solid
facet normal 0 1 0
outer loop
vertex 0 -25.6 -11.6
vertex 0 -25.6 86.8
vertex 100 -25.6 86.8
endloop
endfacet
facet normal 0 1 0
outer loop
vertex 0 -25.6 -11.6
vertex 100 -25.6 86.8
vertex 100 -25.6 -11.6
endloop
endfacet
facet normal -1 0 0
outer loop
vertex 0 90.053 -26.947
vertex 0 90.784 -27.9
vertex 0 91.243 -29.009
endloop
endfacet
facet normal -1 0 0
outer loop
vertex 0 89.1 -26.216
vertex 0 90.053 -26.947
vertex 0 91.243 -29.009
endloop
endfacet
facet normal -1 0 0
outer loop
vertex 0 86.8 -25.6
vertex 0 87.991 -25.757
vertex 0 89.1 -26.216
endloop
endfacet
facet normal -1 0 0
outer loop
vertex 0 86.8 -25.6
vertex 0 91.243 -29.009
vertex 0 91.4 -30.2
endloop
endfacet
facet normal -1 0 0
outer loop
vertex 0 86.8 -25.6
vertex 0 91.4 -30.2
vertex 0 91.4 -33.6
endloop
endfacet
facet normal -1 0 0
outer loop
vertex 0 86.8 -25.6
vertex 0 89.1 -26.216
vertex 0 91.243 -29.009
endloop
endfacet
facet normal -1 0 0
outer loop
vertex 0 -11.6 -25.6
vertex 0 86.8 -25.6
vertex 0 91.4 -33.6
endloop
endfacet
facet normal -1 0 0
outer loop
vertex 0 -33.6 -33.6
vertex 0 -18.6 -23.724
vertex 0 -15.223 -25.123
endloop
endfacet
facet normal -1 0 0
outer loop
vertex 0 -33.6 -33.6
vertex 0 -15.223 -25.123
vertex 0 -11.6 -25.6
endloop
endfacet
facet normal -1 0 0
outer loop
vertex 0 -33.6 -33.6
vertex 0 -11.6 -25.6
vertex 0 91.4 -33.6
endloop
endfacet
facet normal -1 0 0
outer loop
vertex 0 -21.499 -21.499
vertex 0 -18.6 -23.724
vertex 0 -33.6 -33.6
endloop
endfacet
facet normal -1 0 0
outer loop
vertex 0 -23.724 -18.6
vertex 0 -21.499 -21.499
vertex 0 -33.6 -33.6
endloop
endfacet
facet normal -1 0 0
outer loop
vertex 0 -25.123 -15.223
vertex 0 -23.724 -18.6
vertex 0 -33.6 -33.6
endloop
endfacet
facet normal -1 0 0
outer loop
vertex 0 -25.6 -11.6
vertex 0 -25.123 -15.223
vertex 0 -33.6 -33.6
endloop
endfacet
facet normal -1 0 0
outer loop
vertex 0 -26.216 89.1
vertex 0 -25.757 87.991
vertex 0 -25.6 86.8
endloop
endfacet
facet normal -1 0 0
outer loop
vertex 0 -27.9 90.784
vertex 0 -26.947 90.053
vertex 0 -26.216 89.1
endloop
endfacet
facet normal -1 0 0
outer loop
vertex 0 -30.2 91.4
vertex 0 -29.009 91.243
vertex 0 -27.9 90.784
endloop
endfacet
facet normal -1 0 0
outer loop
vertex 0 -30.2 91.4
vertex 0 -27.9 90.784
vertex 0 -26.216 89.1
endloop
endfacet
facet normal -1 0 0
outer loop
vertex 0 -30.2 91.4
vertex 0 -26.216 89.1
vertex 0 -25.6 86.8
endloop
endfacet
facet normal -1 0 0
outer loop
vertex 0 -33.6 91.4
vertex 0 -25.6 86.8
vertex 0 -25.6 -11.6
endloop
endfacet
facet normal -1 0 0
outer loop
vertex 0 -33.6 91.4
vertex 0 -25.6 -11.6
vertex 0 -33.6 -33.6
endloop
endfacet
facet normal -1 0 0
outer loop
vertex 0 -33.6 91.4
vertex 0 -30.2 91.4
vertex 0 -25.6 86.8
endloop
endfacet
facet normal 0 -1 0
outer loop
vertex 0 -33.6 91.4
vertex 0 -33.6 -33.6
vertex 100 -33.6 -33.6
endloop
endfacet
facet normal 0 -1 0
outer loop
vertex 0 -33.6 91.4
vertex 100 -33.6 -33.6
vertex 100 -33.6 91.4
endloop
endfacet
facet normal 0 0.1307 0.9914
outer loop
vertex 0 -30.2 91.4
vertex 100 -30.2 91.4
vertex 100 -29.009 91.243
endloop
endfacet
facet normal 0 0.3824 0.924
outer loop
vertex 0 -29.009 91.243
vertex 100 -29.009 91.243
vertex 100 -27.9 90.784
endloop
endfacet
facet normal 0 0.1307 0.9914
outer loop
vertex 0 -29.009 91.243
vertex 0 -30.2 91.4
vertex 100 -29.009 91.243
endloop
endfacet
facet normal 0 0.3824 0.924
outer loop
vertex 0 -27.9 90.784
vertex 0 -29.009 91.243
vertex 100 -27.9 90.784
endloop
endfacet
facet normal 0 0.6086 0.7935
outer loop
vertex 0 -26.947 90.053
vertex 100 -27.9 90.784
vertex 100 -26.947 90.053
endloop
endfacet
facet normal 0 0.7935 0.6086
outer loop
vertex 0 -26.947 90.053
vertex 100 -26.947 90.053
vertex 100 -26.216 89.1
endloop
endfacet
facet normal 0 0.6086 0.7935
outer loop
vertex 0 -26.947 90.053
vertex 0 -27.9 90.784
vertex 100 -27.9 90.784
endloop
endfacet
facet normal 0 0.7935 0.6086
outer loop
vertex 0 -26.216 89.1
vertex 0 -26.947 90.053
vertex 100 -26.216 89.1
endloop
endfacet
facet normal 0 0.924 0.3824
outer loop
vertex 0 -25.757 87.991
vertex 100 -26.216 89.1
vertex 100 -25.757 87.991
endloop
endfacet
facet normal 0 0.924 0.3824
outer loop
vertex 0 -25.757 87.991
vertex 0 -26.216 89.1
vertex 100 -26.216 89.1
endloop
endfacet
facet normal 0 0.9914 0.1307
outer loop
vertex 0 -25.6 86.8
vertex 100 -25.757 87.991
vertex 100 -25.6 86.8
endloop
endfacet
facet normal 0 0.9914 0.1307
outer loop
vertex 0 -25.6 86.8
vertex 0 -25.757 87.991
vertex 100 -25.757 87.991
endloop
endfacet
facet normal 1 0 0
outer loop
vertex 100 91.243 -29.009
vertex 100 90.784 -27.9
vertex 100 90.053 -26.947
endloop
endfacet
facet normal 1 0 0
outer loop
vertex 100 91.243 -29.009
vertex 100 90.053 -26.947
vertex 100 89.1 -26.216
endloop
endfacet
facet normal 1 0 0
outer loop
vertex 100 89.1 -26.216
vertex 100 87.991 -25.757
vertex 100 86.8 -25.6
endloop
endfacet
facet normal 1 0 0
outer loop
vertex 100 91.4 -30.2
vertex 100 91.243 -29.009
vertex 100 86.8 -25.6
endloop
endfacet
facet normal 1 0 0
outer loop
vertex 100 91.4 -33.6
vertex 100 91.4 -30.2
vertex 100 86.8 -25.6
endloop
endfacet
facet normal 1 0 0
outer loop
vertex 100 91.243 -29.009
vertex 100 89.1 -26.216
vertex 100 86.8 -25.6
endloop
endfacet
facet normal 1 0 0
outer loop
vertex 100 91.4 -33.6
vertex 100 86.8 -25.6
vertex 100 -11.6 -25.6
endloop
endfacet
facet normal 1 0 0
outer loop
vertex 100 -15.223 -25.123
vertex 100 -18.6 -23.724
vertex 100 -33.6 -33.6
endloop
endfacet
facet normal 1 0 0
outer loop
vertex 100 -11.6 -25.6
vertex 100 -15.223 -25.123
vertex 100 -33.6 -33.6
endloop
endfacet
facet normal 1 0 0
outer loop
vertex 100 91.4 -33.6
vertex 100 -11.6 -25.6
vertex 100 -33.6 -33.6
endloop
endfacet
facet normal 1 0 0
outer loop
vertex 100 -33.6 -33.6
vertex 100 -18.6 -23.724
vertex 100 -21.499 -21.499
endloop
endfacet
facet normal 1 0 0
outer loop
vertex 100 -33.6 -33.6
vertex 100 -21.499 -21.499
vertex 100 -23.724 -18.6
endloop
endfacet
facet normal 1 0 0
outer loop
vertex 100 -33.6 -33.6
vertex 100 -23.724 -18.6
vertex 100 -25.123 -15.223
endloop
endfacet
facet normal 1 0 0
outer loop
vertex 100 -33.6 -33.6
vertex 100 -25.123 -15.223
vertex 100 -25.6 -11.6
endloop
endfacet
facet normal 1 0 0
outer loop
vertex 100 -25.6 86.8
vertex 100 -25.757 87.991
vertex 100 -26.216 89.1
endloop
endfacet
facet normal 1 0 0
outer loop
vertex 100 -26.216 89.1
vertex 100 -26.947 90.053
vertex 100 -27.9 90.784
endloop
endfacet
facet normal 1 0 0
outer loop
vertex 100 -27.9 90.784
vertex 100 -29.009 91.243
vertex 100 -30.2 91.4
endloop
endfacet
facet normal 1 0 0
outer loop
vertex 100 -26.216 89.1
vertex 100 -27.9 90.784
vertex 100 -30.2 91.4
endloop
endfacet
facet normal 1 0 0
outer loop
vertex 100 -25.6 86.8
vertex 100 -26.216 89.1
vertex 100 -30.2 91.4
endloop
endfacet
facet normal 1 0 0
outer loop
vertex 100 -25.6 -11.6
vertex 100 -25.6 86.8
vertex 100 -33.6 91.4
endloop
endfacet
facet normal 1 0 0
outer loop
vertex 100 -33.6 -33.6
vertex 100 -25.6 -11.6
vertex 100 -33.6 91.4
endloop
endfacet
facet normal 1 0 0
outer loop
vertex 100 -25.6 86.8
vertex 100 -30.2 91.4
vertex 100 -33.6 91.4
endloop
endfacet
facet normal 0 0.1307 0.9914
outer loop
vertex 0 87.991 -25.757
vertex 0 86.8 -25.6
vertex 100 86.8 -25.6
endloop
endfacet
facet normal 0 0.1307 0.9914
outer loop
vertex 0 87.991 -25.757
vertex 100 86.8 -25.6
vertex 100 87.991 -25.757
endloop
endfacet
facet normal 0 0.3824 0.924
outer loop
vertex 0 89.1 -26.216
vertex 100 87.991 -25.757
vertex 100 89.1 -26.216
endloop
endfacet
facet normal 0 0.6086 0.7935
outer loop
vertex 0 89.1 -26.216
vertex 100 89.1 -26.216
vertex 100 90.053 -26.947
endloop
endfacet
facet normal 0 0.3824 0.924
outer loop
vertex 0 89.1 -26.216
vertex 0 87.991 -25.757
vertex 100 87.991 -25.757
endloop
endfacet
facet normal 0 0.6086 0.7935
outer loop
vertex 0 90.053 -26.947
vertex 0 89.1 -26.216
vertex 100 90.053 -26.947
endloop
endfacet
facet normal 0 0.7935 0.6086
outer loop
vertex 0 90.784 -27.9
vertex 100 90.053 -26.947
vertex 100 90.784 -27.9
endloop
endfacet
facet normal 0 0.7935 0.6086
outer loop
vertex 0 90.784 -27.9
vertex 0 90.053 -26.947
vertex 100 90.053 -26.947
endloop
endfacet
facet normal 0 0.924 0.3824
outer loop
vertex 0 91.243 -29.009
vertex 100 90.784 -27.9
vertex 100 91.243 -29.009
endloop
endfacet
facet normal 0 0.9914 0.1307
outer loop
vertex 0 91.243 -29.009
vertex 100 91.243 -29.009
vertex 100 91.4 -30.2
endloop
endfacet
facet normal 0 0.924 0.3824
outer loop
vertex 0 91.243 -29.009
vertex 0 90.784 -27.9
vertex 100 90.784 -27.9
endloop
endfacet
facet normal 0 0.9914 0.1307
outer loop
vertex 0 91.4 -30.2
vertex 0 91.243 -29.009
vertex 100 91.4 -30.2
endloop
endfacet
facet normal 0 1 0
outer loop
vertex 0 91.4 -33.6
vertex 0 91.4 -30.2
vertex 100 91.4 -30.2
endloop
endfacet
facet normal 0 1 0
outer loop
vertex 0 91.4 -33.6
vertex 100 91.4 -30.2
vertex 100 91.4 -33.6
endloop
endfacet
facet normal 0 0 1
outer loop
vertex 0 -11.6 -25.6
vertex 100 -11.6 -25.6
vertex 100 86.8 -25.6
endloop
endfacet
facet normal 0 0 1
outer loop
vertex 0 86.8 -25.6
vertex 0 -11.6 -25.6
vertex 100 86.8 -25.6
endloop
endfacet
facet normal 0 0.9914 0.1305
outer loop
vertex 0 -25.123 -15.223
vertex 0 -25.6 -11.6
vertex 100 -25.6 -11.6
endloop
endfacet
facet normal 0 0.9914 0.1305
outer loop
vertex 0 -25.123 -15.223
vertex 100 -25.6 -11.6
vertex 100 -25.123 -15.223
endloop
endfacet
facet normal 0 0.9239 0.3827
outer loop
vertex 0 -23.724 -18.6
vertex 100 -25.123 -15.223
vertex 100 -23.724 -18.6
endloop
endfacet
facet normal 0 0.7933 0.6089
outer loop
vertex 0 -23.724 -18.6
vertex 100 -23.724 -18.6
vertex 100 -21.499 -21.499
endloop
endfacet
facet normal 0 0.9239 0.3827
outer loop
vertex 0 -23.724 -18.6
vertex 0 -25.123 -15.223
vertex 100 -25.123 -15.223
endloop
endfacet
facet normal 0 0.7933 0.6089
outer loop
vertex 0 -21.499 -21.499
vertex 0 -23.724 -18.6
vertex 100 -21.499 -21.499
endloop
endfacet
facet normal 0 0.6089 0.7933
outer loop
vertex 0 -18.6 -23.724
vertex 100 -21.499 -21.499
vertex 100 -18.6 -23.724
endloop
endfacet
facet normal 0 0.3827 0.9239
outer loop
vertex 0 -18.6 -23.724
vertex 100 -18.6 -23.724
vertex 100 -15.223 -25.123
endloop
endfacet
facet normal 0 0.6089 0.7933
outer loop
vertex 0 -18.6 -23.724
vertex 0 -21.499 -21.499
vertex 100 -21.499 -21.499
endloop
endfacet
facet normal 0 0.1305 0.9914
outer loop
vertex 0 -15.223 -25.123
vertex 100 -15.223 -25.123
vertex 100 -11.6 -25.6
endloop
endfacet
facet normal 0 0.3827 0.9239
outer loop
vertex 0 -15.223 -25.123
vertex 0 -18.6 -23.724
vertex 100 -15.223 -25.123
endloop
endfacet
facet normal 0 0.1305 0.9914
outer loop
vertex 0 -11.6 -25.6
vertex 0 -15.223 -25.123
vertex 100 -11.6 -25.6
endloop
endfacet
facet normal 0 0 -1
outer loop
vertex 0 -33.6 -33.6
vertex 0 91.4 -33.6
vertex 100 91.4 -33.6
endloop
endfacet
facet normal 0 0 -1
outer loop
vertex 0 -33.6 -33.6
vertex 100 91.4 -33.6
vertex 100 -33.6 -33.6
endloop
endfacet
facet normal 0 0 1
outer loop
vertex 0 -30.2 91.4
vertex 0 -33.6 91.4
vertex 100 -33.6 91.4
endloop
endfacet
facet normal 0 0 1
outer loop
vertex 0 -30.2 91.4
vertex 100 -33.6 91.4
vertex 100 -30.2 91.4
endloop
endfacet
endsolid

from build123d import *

# Parameters (mm, degrees)
MEMBER_8509_86_125_125_8_1_DEPTH = 100


with BuildPart() as part:
    # Sketch11 → Member 8509-86 125_125_8_1 (new body)
    with BuildSketch(Plane.YZ):
        with BuildLine():
            Line((-33.6, -33.6), (-33.6, 91.4))
            Line((-33.6, 91.4), (-30.2, 91.4))
            ThreePointArc((-30.2, 91.4), (-26.947308807, 90.052691193), (-25.6, 86.8))
            Line((-25.6, 86.8), (-25.6, -11.6))
            ThreePointArc((-25.6, -11.6), (-21.499494937, -21.499494937), (-11.6, -25.6))
            Line((-11.6, -25.6), (86.8, -25.6))
            ThreePointArc((86.8, -25.6), (90.052691193, -26.947308807), (91.4, -30.2))
            Line((91.4, -30.2), (91.4, -33.6))
            Line((91.4, -33.6), (-33.6, -33.6))
        make_face()
    extrude(amount=MEMBER_8509_86_125_125_8_1_DEPTH)


solid = part.part
